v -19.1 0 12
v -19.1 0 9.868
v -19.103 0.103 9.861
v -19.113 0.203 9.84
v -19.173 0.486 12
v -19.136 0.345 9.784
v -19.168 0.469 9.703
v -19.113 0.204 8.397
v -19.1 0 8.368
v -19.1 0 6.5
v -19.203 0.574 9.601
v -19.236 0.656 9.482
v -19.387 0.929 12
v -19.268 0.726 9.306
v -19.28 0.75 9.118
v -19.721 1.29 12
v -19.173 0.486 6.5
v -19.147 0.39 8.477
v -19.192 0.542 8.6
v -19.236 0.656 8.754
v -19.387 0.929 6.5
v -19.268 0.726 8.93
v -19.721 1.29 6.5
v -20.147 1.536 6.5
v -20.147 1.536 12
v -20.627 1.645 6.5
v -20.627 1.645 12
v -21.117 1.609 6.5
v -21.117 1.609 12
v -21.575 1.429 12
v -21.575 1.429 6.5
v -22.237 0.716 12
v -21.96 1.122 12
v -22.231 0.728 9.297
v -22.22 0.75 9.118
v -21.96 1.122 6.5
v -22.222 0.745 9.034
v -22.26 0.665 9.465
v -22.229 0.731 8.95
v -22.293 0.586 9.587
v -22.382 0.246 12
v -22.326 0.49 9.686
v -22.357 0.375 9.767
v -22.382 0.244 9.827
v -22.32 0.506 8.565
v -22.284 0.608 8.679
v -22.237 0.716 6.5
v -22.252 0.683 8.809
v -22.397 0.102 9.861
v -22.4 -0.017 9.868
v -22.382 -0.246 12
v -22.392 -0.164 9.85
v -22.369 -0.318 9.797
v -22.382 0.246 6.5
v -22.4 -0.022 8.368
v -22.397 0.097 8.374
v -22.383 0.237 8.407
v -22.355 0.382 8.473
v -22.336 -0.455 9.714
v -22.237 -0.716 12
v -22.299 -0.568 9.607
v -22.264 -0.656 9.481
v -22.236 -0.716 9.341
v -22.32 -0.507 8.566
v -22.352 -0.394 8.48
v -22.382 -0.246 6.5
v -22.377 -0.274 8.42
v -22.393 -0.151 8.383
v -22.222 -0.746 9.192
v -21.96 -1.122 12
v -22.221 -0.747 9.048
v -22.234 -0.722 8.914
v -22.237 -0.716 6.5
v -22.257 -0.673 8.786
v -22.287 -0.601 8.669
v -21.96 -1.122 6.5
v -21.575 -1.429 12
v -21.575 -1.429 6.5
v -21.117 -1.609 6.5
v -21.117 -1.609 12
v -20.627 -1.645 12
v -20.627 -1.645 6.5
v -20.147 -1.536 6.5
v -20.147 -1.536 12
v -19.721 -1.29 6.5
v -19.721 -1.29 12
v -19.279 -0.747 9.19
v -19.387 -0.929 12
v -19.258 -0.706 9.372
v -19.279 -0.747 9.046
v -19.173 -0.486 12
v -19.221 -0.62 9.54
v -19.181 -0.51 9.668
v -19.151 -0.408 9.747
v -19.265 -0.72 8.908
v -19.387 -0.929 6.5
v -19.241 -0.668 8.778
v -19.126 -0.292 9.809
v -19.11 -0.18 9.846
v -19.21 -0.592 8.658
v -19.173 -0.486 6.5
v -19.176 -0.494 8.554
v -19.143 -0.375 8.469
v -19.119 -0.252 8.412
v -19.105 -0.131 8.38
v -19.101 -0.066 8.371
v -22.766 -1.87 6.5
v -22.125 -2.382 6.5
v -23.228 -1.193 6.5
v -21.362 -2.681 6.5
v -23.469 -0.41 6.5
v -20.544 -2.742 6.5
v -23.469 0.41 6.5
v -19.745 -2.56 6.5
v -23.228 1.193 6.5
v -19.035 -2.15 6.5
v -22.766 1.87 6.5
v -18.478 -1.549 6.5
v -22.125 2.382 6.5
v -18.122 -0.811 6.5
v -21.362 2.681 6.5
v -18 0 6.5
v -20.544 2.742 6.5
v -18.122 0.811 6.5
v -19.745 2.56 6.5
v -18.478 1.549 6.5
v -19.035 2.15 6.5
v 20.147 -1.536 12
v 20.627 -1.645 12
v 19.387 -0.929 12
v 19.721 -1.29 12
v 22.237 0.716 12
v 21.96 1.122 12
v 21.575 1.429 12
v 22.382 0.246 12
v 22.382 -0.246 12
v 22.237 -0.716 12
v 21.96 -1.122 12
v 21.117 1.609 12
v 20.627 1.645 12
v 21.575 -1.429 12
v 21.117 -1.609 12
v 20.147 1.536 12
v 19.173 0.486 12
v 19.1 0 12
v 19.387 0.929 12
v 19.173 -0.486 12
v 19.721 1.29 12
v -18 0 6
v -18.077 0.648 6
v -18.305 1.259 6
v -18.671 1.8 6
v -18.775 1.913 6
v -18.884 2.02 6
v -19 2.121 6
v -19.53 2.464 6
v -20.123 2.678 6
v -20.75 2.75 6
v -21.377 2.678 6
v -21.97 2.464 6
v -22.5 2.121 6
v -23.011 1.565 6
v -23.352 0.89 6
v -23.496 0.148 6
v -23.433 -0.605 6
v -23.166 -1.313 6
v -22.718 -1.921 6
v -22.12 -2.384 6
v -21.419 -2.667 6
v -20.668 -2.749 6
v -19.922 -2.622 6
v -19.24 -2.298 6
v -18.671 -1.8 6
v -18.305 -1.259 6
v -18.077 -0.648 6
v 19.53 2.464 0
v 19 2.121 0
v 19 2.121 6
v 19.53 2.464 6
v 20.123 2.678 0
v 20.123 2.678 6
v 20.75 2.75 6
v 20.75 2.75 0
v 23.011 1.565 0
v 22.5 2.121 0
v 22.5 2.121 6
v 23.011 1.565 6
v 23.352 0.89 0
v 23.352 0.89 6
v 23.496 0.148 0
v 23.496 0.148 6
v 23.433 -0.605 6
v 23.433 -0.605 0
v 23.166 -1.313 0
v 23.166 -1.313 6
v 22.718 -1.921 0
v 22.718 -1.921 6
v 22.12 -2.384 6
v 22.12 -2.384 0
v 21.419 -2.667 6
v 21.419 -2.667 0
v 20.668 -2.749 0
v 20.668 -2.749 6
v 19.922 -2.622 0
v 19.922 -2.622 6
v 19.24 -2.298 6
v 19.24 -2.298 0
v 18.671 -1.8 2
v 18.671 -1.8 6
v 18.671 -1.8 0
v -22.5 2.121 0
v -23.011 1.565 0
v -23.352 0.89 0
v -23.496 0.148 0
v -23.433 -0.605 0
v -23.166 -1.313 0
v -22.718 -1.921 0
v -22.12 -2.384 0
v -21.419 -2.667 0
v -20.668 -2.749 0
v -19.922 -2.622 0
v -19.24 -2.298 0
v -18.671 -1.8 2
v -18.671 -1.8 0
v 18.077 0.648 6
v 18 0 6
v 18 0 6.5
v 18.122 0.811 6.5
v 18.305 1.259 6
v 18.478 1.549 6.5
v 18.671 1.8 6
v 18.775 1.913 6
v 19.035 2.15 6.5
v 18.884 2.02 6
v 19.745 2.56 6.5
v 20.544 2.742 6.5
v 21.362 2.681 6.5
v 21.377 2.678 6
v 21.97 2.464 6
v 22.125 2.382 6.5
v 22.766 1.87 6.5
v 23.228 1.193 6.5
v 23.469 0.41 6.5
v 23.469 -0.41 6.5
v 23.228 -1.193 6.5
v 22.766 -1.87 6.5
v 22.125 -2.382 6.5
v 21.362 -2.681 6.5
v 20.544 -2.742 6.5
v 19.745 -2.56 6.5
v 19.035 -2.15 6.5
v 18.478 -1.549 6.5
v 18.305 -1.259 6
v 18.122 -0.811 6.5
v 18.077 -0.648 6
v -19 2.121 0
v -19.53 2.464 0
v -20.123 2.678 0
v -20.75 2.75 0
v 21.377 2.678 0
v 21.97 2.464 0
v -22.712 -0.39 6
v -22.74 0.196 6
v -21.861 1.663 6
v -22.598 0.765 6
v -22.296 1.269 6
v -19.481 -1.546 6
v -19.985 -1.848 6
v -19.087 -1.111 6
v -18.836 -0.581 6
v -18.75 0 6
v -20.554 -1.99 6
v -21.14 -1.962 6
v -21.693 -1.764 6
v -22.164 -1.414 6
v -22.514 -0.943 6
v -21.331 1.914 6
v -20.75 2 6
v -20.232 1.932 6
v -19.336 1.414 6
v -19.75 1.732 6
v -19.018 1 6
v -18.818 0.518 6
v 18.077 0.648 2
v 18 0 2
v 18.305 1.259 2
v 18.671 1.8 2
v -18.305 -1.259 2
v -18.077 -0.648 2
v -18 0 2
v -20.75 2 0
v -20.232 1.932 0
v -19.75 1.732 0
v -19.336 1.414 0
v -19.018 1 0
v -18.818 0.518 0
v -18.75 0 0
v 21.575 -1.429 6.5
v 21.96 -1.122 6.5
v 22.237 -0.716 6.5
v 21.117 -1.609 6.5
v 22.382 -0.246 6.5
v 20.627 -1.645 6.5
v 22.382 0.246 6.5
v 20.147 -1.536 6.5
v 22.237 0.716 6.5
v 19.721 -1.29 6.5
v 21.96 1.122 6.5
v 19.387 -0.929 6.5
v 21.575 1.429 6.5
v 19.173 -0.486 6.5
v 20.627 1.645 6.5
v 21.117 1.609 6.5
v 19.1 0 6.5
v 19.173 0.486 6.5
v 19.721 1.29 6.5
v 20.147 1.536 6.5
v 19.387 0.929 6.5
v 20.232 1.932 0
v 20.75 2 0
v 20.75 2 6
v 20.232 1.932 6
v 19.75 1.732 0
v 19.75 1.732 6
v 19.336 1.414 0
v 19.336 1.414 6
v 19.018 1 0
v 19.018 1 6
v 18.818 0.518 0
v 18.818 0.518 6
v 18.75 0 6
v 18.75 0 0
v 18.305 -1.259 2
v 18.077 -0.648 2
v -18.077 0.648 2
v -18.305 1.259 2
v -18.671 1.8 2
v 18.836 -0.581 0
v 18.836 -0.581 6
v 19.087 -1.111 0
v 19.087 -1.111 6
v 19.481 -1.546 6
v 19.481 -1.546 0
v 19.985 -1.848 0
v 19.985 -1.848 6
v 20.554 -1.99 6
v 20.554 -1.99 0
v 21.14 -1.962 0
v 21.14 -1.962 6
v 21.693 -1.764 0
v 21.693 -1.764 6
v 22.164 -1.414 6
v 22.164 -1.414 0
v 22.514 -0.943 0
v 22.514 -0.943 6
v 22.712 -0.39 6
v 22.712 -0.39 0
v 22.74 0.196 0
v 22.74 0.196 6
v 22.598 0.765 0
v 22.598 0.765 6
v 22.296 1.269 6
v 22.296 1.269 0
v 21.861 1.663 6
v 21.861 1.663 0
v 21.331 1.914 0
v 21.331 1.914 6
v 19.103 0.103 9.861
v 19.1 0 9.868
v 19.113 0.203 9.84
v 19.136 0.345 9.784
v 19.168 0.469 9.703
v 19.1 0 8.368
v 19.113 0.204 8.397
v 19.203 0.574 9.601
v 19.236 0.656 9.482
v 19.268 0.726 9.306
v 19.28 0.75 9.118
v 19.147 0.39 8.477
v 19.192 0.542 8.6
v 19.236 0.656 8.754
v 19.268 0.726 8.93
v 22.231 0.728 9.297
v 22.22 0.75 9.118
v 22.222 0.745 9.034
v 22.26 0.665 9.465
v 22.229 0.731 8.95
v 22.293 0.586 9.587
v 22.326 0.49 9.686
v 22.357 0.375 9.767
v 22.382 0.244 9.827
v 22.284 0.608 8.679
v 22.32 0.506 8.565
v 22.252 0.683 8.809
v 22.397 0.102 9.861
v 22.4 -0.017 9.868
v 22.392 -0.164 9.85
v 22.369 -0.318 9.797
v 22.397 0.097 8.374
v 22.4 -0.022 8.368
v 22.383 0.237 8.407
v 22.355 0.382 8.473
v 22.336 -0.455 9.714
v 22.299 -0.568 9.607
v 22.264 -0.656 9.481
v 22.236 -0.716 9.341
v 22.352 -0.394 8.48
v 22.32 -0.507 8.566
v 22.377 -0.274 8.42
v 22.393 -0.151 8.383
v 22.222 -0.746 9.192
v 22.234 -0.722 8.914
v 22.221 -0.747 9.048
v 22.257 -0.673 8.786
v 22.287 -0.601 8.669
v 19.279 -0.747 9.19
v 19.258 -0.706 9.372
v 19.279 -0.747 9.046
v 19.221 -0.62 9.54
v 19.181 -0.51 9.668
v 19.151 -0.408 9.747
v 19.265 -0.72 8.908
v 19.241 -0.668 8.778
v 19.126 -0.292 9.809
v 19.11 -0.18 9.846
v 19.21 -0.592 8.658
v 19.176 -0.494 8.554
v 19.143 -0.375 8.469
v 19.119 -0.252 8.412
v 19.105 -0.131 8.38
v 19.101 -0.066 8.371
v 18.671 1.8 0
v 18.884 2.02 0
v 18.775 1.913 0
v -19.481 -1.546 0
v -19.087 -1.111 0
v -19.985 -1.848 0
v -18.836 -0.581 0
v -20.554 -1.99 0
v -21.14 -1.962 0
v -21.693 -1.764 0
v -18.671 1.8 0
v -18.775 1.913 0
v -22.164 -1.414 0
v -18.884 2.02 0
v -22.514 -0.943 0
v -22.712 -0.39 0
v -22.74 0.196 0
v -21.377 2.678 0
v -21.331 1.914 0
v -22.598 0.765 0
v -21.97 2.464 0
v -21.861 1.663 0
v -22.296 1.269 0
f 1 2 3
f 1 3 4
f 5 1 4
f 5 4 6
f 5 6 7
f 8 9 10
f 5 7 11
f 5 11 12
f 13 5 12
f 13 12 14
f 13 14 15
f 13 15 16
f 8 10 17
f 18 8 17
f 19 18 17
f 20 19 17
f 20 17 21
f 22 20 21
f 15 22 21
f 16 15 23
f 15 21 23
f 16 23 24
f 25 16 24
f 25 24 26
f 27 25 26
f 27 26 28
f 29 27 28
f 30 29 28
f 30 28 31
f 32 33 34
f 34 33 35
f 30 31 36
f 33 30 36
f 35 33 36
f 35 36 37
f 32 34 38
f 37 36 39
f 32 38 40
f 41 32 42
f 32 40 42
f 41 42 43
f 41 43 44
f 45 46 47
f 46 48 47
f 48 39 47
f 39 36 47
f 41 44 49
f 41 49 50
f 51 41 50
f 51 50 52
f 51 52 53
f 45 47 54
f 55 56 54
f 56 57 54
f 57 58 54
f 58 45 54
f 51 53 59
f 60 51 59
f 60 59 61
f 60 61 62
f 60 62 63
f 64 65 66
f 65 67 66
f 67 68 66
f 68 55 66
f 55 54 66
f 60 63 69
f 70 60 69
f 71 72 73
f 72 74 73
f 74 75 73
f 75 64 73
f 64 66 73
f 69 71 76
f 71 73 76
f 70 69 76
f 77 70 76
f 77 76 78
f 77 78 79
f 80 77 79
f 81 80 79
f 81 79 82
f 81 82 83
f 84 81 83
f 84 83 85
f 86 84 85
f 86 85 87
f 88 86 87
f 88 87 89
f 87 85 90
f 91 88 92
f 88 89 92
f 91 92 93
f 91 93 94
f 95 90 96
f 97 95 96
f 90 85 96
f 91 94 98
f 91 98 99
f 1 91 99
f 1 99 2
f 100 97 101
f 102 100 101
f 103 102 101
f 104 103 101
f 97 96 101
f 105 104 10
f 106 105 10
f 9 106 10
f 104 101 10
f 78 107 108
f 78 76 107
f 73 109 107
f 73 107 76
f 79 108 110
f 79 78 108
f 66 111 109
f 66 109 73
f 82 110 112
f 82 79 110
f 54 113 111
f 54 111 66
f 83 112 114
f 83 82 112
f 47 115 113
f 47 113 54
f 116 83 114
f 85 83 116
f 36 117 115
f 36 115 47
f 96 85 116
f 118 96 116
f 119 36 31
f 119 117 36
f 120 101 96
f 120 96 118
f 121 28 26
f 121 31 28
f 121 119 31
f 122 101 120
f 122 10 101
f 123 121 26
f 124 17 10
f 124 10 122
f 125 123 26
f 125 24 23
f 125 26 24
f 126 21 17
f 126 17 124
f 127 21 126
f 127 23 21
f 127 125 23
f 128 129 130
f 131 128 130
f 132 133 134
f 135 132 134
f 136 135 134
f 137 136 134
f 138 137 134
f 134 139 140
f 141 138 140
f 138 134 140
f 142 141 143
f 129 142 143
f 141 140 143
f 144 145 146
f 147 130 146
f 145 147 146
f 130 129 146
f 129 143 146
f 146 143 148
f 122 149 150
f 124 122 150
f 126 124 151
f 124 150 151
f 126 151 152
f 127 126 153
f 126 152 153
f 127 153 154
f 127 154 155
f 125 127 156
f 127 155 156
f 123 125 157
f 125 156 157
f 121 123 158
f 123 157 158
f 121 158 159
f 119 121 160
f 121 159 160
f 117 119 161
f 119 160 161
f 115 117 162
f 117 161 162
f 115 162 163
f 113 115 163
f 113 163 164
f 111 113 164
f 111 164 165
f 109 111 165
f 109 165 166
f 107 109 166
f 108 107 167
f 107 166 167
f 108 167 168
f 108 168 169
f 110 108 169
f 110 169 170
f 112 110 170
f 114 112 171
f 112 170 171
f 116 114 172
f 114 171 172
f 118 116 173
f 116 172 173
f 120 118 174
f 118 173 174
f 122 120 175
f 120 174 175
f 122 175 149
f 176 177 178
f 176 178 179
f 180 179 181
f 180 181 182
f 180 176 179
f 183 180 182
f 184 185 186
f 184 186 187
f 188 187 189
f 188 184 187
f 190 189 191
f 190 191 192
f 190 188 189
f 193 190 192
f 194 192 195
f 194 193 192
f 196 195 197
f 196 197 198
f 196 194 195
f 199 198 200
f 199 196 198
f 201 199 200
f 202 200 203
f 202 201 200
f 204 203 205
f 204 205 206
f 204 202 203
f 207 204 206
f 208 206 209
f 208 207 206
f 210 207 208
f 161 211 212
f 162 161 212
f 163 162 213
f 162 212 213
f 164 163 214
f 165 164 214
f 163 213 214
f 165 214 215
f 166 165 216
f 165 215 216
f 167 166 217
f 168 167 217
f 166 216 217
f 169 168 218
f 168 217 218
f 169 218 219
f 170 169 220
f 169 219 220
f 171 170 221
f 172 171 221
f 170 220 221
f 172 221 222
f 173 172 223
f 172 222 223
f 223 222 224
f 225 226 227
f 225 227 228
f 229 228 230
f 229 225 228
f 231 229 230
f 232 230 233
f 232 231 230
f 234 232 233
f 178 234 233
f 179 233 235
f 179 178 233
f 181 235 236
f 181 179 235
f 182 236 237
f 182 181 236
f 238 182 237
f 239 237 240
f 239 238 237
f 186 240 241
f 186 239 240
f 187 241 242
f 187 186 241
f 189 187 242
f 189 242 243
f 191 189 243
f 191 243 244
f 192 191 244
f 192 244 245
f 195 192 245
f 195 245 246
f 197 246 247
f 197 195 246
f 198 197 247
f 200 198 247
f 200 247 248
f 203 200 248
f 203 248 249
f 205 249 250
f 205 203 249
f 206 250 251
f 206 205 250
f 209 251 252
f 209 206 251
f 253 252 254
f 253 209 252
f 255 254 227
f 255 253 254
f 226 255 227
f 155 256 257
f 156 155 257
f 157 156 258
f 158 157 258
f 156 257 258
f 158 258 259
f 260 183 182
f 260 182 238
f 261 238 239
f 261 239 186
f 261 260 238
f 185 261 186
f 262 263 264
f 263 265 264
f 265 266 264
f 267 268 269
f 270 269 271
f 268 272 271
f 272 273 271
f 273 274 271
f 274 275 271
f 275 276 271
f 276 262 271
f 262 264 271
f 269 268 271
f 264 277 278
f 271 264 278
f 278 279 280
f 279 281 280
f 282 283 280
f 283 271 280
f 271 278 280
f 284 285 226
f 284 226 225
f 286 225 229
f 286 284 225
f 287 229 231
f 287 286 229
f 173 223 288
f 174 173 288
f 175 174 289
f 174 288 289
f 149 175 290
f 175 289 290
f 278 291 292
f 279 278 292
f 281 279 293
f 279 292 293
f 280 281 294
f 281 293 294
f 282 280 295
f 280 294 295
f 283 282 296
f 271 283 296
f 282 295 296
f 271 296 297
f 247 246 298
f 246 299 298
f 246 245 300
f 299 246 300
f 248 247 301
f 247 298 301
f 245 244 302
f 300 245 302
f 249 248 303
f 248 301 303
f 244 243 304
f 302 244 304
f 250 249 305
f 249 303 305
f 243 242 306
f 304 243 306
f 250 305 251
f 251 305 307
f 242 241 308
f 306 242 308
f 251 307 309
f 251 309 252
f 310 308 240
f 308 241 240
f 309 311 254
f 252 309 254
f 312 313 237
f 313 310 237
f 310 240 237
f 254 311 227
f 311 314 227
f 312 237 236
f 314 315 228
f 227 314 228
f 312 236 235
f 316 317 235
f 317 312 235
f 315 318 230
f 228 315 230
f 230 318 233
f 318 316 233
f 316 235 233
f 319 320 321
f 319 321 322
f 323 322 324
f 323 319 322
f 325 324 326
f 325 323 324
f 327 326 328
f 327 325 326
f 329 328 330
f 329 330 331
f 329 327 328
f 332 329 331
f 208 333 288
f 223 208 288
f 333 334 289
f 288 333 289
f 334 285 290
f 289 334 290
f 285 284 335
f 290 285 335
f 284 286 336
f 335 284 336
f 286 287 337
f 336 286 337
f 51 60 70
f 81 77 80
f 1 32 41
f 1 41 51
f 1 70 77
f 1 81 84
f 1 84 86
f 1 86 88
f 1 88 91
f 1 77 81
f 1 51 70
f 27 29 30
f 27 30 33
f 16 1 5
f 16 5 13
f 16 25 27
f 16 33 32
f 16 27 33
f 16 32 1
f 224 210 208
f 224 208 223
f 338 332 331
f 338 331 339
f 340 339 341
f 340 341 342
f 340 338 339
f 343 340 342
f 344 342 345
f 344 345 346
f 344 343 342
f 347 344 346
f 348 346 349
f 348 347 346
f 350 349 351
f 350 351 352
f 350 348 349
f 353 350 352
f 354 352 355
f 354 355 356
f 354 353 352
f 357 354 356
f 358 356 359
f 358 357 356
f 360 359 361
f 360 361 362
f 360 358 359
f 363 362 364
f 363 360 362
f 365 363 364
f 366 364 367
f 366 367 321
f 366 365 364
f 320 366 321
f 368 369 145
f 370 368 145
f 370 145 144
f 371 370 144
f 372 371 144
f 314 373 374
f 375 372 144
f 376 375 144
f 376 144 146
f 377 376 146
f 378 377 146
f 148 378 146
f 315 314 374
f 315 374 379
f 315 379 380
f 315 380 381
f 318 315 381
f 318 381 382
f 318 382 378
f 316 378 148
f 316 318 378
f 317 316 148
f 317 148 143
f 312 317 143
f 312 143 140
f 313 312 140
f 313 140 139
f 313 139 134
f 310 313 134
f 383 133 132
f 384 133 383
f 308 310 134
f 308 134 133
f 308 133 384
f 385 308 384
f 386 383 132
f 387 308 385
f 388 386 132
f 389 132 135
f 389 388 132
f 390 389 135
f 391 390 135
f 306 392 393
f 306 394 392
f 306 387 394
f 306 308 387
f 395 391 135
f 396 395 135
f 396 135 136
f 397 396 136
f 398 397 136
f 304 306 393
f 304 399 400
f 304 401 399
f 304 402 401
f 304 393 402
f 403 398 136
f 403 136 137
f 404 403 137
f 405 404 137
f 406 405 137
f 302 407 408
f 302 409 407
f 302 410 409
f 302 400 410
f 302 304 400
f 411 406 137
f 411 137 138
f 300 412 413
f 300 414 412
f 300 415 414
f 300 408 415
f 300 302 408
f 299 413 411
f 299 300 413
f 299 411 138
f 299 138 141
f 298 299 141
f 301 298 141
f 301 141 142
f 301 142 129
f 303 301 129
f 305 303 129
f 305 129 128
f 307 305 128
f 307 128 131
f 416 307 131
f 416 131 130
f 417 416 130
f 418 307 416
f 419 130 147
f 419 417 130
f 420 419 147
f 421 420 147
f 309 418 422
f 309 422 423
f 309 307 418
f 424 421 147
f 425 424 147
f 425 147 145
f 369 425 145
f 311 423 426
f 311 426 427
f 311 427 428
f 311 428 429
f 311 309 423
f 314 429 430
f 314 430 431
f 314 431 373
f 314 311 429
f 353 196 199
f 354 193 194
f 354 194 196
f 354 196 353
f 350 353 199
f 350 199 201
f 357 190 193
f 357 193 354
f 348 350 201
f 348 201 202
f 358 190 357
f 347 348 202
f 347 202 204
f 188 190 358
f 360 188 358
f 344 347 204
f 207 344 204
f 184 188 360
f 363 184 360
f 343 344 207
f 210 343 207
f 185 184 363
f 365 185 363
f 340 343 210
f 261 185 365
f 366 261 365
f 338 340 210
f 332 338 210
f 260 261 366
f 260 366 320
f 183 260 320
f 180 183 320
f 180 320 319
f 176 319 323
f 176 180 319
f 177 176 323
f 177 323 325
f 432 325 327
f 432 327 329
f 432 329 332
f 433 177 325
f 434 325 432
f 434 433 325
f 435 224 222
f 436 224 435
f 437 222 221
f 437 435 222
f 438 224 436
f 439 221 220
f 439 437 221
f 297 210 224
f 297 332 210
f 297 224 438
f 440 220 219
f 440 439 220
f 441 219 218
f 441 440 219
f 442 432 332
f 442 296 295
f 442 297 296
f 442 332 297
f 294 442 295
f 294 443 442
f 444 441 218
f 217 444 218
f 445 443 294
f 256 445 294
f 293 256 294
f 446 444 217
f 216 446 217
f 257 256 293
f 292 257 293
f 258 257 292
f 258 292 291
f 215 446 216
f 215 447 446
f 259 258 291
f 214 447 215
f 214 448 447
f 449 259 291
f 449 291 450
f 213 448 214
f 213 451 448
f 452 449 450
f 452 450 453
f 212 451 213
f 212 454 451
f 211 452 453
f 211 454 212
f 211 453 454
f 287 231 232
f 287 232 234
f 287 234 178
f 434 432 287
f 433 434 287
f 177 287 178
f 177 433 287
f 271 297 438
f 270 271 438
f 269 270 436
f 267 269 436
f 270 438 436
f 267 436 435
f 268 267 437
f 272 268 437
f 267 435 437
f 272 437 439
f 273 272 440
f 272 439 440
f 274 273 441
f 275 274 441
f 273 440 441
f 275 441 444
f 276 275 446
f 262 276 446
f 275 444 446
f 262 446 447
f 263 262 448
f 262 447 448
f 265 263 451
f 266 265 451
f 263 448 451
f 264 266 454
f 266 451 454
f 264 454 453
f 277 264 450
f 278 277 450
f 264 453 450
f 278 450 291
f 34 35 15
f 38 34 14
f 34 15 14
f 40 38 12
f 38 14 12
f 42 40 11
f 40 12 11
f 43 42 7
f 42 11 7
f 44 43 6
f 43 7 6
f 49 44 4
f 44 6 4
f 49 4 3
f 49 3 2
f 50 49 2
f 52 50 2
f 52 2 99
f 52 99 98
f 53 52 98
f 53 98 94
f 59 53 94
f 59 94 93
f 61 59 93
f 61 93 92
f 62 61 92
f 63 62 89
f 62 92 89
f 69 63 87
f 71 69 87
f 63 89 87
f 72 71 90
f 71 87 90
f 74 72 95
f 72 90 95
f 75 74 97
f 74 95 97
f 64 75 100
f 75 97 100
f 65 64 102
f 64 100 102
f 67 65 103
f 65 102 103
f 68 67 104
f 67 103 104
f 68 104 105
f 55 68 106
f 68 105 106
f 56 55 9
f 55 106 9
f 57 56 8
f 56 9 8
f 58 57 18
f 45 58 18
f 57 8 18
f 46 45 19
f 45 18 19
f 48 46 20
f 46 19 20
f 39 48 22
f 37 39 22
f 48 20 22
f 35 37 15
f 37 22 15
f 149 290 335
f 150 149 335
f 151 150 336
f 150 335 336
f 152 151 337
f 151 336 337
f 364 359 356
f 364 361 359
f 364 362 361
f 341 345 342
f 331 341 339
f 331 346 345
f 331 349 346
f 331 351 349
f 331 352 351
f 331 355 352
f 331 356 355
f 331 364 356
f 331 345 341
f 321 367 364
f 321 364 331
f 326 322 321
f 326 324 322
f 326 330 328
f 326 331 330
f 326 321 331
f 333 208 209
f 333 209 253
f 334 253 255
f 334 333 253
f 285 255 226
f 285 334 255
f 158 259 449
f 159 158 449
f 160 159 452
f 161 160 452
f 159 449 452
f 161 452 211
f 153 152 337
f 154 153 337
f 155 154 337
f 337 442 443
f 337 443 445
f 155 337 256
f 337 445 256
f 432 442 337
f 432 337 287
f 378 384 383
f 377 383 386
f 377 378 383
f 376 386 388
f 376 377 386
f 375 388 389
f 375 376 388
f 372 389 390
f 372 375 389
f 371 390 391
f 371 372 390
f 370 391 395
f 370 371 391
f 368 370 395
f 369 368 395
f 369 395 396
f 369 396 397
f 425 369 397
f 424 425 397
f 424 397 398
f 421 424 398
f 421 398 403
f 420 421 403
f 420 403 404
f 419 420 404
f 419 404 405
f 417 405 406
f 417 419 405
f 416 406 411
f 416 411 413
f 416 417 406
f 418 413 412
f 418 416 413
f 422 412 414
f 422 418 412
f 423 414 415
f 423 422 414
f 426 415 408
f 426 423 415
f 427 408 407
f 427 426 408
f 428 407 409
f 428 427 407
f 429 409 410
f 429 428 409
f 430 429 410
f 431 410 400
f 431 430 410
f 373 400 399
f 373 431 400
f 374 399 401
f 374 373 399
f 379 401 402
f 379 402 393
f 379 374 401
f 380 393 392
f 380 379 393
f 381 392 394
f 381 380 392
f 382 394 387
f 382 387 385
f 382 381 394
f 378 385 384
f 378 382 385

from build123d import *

# Parameters (mm, degrees)
F1_DEPTH = 6
F2_DEPTH = 2
F3_R     = 2.75
F3_R_2   = 2
F4_DEPTH = 0.5
F5_R     = 1.65
F6_DEPTH = 5.5
F8_R     = 0.75
F9_DEPTH = 24.501


with BuildPart() as f1:
    # F0 (on Top) → F1 (new body)
    with BuildSketch(Plane.XY):
        with BuildLine():
            Line((-18.75, 0), (-18, 0))
            ThreePointArc((-18, 0), (-18.1731878907, 0.9604891218), (-18.6709377114, 1.8))
            ThreePointArc((-18.6709377114, 1.8), (-18.8287396862, 1.967551475), (-19, 2.1213203436))
            ThreePointArc((-19, 2.1213203436), (-19.8202502877, 2.5880621075), (-20.75, 2.75))
            Line((-20.75, 2.75), (-20.75, 2))
            ThreePointArc((-20.75, 2), (-19.3357864376, 1.4142135624), (-18.75, 0))
        make_face()
        with BuildLine():
            ThreePointArc((-18.6709377114, -1.8), (-18.1731878907, -0.9604891218), (-18, 0))
            Line((-18, 0), (-18.75, 0))
            ThreePointArc((-18.75, 0), (-22.1642135624, -1.4142135624), (-20.75, 2))
            Line((-20.75, 2), (-20.75, 2.75))
            ThreePointArc((-20.75, 2.75), (-21.6797497123, 2.5880621075), (-22.5, 2.1213203436))
            ThreePointArc((-22.5, 2.1213203436), (-22.717551475, -1.9212603138), (-18.6709377114, -1.8))
        make_face()
    extrude(amount=F1_DEPTH)

    # F0 (on Top) → F2 (join)
    with BuildSketch(Plane.XY):
        with BuildLine():
            Line((-18, 0), (0, 0))
            Line((0, 0), (0, 1.8))
            Line((0, 1.8), (-18.6709377114, 1.8))
            ThreePointArc((-18.6709377114, 1.8), (-18.1731878907, 0.9604891218), (-18, 0))
        make_face()
        with BuildLine():
            Line((0, -1.8), (0, 0))
            Line((0, 0), (-18, 0))
            ThreePointArc((-18, 0), (-18.1731878907, -0.9604891218), (-18.6709377114, -1.8))
            Line((-18.6709377114, -1.8), (0, -1.8))
        make_face()
    extrude(amount=F2_DEPTH)

    # F3 (on face) → F4 (join)
    with BuildSketch(Plane.XY.offset(6)):
        with Locations((-20.75, 0)):
            Circle(F3_R)
        with Locations((-20.75, 0)):
            Circle(F3_R_2, mode=Mode.SUBTRACT)
        with Locations((-20.75, 0)):
            Circle(F3_R_2)
    extrude(amount=F4_DEPTH)

    # F5 (on face) → F6 (join)
    with BuildSketch(Plane.XY.offset(6.5)):
        with Locations((-20.75, 0)):
            Circle(F5_R)
    extrude(amount=F6_DEPTH)

    # F8 (on offset) → F9 (cut, through all)
    with BuildSketch(Plane.YZ.offset(1)):
        with Locations((0, 9.1180996969)):
            Circle(F8_R)
    extrude(amount=-F9_DEPTH, mode=Mode.SUBTRACT)

    # F10: F1 across plane


with BuildPart() as f1_1:
    add(f1.part)
    add(f1.part.mirror(Plane.YZ))


solid = f1_1.part
